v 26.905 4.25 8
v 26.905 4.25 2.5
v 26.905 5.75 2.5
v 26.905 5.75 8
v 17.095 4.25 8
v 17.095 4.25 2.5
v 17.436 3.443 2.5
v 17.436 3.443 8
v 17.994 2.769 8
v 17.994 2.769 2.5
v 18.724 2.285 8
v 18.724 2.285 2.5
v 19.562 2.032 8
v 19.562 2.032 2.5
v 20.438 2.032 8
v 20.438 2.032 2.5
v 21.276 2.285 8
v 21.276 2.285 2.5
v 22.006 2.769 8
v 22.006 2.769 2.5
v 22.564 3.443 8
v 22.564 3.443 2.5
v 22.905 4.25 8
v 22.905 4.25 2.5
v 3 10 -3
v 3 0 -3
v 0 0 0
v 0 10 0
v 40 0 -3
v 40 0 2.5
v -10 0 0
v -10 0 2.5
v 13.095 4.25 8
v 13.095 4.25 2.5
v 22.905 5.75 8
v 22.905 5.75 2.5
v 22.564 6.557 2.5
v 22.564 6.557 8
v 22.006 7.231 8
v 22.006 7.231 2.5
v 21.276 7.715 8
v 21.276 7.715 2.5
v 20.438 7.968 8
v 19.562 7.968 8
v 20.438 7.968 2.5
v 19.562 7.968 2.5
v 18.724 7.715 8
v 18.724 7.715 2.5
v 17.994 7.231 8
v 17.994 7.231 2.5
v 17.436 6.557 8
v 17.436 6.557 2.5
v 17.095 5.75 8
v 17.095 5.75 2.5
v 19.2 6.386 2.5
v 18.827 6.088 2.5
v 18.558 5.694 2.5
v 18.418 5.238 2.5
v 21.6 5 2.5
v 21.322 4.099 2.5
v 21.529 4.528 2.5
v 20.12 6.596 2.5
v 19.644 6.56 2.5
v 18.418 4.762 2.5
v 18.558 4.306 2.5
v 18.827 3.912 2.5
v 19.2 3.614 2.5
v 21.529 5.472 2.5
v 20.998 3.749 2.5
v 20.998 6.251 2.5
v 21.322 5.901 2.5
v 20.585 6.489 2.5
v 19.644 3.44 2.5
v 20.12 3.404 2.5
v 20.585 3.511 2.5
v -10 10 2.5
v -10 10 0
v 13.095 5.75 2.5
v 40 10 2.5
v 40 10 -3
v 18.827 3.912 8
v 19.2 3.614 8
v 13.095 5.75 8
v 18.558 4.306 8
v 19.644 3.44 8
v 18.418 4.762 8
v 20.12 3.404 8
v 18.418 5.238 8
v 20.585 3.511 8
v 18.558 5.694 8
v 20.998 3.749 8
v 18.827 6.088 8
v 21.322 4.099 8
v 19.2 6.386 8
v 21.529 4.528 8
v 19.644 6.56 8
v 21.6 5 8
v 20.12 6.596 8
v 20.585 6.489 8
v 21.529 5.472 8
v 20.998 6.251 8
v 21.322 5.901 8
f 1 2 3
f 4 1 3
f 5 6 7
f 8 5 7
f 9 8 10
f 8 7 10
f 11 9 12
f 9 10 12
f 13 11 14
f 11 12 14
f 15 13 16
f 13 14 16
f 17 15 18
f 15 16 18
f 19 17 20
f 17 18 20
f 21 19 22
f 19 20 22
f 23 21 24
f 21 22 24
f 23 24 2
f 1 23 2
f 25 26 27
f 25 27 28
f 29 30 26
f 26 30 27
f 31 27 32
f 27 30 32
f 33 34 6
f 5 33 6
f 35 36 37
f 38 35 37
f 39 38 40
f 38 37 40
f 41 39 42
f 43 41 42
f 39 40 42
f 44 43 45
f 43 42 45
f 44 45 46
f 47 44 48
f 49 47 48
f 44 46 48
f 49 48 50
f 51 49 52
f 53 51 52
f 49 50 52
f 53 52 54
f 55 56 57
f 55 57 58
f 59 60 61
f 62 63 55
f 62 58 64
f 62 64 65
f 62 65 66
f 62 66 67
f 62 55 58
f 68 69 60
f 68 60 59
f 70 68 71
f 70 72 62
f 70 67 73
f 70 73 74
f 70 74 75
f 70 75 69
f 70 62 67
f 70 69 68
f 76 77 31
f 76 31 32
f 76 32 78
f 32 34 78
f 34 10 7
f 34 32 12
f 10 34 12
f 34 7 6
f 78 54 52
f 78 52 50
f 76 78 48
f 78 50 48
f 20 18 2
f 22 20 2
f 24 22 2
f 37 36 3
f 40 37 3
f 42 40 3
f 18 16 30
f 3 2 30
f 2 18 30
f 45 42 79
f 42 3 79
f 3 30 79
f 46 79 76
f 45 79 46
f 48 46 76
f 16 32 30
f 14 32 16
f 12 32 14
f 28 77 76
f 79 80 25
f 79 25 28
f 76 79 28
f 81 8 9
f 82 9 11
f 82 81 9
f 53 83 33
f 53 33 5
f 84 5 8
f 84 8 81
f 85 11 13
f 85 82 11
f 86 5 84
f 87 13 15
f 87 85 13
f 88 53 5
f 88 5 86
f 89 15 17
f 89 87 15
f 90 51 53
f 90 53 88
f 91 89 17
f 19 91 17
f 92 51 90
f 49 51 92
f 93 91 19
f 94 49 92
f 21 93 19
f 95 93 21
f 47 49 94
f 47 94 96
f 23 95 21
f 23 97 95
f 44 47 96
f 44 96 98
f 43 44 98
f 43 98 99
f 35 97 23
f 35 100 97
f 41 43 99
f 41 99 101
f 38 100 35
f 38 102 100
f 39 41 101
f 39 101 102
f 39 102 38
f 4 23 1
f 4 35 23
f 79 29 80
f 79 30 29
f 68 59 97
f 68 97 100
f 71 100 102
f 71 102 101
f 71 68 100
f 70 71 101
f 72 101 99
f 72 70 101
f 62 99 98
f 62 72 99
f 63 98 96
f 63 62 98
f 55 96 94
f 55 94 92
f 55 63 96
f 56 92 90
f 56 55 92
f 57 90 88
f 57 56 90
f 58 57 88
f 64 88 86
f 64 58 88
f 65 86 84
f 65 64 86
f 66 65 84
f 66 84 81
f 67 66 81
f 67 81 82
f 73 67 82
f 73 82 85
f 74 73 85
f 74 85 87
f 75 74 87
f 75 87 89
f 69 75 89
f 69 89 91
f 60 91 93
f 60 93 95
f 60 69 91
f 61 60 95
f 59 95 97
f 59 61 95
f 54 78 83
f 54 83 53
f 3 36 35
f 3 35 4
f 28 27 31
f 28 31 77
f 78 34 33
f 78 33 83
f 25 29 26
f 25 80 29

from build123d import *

# Parameters (mm, degrees)
SKETCH_1_W      = 40
SKETCH_1_H      = 10
EXTRUDE_1_DEPTH = 2.5
SKETCH_3_W      = 4
SKETCH_3_H      = 10
EXTRUDE_3_DEPTH = 3
SKETCH_4_W      = 15
SKETCH_4_H      = 1.5
SKETCH_4_W_2    = 3
SKETCH_4_H_2    = 3.5
EXTRUDE_4_DEPTH = 3
CHAMFER_1_SIZE  = 1.5
SKETCH_6_R      = 3
SKETCH_6_R_2    = 1.6
EXTRUDE_5_DEPTH = 5.5
SKETCH_7_W      = 2.5
SKETCH_7_H      = 10
EXTRUDE_6_DEPTH = 10
SKETCH_8_W      = 4
SKETCH_8_H      = 1.5
EXTRUDE_7_DEPTH = 5.5
SKETCH_9_W      = 33
SKETCH_9_H      = 10
EXTRUDE_8_DEPTH = 3
CHAMFER_2_SIZE  = 3


with BuildPart() as part:
    # 草图1 → 凸台-拉伸1 (new body)
    with BuildSketch(Plane.XY):
        with Locations((20, 5)):
            Rectangle(SKETCH_1_W, SKETCH_1_H)
    extrude(amount=EXTRUDE_1_DEPTH)

    # 草图3 → 凸台-拉伸3 (add)
    with BuildSketch(Plane(origin=(0, 0, 0), x_dir=(-1, 0, 0), z_dir=(0, 0, -1))):
        with Locations((-38, 5)):
            Rectangle(SKETCH_3_W, SKETCH_3_H)
    extrude(amount=EXTRUDE_3_DEPTH)

    # 草图4 → 凸台-拉伸4 (add)
    with BuildSketch(Plane(origin=(0, 0, 0), x_dir=(-1, 0, 0), z_dir=(0, 0, -1))):
        with Locations((-28.5, 5.75)):
            Rectangle(SKETCH_4_W, SKETCH_4_H)
        with Locations((-28.5, 4.25)):
            Rectangle(SKETCH_4_W, SKETCH_4_H)
        with Locations((-19.5, 5.75)):
            Rectangle(SKETCH_4_W_2, SKETCH_4_H)
        with Locations((-19.5, 4.25)):
            Rectangle(SKETCH_4_W_2, SKETCH_4_H)
        with Locations((-19.5, 8.25)):
            Rectangle(SKETCH_4_W_2, SKETCH_4_H_2)
        with Locations((-19.5, 1.75)):
            Rectangle(SKETCH_4_W_2, SKETCH_4_H_2)
        with Locations((-10.5, 5.75)):
            Rectangle(SKETCH_4_W, SKETCH_4_H)
        with Locations((-10.5, 4.25)):
            Rectangle(SKETCH_4_W, SKETCH_4_H)
        with Locations((-1.5, 5.75)):
            Rectangle(SKETCH_4_W_2, SKETCH_4_H)
        with Locations((-1.5, 4.25)):
            Rectangle(SKETCH_4_W_2, SKETCH_4_H)
        with Locations((-1.5, 8.25)):
            Rectangle(SKETCH_4_W_2, SKETCH_4_H_2)
        with Locations((-1.5, 1.75)):
            Rectangle(SKETCH_4_W_2, SKETCH_4_H_2)
    extrude(amount=EXTRUDE_4_DEPTH)

    # 倒角1
    chamfer_1_edges = [part.edges().sort_by_distance(p)[0] for p in [
        (10.5, 3.5, 0),
        (28.5, 3.5, 0),
    ]]
    chamfer(chamfer_1_edges, length=CHAMFER_1_SIZE)
    chamfer_1_2_edges = [part.edges().sort_by_distance(p)[0] for p in [
        (10.5, 3.5, -3),
        (28.5, 3.5, -3),
    ]]
    chamfer(chamfer_1_2_edges, length=CHAMFER_1_SIZE - 0.0001)  # a hair under: the kernel refuses the full size

    # 草图6 → 凸台-拉伸5 (add)
    with BuildSketch(Plane.XY.offset(2.5)):
        with Locations(Location((20, 5, 0), (0, 0, 180))):
            Circle(SKETCH_6_R)
        with Locations((20, 5)):
            Circle(SKETCH_6_R_2, mode=Mode.SUBTRACT)
    extrude(amount=EXTRUDE_5_DEPTH)

    # 草图7 → 凸台-拉伸6 (add)
    with BuildSketch(Plane.ZY):
        with Locations((1.25, 5)):
            Rectangle(SKETCH_7_W, SKETCH_7_H)
    extrude(amount=EXTRUDE_6_DEPTH)

    # 草图8 → 凸台-拉伸7 (add)
    with BuildSketch(Plane.XY.offset(2.5)):
        with Locations((15.09526249, 5)):
            Rectangle(SKETCH_8_W, SKETCH_8_H)
        with Locations((24.90473751, 5)):
            Rectangle(SKETCH_8_W, SKETCH_8_H)
    extrude(amount=EXTRUDE_7_DEPTH)

    # 草图9 → 凸台-拉伸8 (add)
    with BuildSketch(Plane(origin=(0, 0, 0), x_dir=(-1, 0, 0), z_dir=(0, 0, -1))):
        with Locations((-19.5, 5)):
            Rectangle(SKETCH_9_W, SKETCH_9_H)
    extrude(amount=EXTRUDE_8_DEPTH)

    # 倒角2
    chamfer_2_edges = [part.edges().sort_by_distance(p)[0] for p in [
        (0, 5, -3),
    ]]
    chamfer(chamfer_2_edges, length=CHAMFER_2_SIZE - 0.0001)  # a hair under: the kernel refuses the full size


solid = part.part
